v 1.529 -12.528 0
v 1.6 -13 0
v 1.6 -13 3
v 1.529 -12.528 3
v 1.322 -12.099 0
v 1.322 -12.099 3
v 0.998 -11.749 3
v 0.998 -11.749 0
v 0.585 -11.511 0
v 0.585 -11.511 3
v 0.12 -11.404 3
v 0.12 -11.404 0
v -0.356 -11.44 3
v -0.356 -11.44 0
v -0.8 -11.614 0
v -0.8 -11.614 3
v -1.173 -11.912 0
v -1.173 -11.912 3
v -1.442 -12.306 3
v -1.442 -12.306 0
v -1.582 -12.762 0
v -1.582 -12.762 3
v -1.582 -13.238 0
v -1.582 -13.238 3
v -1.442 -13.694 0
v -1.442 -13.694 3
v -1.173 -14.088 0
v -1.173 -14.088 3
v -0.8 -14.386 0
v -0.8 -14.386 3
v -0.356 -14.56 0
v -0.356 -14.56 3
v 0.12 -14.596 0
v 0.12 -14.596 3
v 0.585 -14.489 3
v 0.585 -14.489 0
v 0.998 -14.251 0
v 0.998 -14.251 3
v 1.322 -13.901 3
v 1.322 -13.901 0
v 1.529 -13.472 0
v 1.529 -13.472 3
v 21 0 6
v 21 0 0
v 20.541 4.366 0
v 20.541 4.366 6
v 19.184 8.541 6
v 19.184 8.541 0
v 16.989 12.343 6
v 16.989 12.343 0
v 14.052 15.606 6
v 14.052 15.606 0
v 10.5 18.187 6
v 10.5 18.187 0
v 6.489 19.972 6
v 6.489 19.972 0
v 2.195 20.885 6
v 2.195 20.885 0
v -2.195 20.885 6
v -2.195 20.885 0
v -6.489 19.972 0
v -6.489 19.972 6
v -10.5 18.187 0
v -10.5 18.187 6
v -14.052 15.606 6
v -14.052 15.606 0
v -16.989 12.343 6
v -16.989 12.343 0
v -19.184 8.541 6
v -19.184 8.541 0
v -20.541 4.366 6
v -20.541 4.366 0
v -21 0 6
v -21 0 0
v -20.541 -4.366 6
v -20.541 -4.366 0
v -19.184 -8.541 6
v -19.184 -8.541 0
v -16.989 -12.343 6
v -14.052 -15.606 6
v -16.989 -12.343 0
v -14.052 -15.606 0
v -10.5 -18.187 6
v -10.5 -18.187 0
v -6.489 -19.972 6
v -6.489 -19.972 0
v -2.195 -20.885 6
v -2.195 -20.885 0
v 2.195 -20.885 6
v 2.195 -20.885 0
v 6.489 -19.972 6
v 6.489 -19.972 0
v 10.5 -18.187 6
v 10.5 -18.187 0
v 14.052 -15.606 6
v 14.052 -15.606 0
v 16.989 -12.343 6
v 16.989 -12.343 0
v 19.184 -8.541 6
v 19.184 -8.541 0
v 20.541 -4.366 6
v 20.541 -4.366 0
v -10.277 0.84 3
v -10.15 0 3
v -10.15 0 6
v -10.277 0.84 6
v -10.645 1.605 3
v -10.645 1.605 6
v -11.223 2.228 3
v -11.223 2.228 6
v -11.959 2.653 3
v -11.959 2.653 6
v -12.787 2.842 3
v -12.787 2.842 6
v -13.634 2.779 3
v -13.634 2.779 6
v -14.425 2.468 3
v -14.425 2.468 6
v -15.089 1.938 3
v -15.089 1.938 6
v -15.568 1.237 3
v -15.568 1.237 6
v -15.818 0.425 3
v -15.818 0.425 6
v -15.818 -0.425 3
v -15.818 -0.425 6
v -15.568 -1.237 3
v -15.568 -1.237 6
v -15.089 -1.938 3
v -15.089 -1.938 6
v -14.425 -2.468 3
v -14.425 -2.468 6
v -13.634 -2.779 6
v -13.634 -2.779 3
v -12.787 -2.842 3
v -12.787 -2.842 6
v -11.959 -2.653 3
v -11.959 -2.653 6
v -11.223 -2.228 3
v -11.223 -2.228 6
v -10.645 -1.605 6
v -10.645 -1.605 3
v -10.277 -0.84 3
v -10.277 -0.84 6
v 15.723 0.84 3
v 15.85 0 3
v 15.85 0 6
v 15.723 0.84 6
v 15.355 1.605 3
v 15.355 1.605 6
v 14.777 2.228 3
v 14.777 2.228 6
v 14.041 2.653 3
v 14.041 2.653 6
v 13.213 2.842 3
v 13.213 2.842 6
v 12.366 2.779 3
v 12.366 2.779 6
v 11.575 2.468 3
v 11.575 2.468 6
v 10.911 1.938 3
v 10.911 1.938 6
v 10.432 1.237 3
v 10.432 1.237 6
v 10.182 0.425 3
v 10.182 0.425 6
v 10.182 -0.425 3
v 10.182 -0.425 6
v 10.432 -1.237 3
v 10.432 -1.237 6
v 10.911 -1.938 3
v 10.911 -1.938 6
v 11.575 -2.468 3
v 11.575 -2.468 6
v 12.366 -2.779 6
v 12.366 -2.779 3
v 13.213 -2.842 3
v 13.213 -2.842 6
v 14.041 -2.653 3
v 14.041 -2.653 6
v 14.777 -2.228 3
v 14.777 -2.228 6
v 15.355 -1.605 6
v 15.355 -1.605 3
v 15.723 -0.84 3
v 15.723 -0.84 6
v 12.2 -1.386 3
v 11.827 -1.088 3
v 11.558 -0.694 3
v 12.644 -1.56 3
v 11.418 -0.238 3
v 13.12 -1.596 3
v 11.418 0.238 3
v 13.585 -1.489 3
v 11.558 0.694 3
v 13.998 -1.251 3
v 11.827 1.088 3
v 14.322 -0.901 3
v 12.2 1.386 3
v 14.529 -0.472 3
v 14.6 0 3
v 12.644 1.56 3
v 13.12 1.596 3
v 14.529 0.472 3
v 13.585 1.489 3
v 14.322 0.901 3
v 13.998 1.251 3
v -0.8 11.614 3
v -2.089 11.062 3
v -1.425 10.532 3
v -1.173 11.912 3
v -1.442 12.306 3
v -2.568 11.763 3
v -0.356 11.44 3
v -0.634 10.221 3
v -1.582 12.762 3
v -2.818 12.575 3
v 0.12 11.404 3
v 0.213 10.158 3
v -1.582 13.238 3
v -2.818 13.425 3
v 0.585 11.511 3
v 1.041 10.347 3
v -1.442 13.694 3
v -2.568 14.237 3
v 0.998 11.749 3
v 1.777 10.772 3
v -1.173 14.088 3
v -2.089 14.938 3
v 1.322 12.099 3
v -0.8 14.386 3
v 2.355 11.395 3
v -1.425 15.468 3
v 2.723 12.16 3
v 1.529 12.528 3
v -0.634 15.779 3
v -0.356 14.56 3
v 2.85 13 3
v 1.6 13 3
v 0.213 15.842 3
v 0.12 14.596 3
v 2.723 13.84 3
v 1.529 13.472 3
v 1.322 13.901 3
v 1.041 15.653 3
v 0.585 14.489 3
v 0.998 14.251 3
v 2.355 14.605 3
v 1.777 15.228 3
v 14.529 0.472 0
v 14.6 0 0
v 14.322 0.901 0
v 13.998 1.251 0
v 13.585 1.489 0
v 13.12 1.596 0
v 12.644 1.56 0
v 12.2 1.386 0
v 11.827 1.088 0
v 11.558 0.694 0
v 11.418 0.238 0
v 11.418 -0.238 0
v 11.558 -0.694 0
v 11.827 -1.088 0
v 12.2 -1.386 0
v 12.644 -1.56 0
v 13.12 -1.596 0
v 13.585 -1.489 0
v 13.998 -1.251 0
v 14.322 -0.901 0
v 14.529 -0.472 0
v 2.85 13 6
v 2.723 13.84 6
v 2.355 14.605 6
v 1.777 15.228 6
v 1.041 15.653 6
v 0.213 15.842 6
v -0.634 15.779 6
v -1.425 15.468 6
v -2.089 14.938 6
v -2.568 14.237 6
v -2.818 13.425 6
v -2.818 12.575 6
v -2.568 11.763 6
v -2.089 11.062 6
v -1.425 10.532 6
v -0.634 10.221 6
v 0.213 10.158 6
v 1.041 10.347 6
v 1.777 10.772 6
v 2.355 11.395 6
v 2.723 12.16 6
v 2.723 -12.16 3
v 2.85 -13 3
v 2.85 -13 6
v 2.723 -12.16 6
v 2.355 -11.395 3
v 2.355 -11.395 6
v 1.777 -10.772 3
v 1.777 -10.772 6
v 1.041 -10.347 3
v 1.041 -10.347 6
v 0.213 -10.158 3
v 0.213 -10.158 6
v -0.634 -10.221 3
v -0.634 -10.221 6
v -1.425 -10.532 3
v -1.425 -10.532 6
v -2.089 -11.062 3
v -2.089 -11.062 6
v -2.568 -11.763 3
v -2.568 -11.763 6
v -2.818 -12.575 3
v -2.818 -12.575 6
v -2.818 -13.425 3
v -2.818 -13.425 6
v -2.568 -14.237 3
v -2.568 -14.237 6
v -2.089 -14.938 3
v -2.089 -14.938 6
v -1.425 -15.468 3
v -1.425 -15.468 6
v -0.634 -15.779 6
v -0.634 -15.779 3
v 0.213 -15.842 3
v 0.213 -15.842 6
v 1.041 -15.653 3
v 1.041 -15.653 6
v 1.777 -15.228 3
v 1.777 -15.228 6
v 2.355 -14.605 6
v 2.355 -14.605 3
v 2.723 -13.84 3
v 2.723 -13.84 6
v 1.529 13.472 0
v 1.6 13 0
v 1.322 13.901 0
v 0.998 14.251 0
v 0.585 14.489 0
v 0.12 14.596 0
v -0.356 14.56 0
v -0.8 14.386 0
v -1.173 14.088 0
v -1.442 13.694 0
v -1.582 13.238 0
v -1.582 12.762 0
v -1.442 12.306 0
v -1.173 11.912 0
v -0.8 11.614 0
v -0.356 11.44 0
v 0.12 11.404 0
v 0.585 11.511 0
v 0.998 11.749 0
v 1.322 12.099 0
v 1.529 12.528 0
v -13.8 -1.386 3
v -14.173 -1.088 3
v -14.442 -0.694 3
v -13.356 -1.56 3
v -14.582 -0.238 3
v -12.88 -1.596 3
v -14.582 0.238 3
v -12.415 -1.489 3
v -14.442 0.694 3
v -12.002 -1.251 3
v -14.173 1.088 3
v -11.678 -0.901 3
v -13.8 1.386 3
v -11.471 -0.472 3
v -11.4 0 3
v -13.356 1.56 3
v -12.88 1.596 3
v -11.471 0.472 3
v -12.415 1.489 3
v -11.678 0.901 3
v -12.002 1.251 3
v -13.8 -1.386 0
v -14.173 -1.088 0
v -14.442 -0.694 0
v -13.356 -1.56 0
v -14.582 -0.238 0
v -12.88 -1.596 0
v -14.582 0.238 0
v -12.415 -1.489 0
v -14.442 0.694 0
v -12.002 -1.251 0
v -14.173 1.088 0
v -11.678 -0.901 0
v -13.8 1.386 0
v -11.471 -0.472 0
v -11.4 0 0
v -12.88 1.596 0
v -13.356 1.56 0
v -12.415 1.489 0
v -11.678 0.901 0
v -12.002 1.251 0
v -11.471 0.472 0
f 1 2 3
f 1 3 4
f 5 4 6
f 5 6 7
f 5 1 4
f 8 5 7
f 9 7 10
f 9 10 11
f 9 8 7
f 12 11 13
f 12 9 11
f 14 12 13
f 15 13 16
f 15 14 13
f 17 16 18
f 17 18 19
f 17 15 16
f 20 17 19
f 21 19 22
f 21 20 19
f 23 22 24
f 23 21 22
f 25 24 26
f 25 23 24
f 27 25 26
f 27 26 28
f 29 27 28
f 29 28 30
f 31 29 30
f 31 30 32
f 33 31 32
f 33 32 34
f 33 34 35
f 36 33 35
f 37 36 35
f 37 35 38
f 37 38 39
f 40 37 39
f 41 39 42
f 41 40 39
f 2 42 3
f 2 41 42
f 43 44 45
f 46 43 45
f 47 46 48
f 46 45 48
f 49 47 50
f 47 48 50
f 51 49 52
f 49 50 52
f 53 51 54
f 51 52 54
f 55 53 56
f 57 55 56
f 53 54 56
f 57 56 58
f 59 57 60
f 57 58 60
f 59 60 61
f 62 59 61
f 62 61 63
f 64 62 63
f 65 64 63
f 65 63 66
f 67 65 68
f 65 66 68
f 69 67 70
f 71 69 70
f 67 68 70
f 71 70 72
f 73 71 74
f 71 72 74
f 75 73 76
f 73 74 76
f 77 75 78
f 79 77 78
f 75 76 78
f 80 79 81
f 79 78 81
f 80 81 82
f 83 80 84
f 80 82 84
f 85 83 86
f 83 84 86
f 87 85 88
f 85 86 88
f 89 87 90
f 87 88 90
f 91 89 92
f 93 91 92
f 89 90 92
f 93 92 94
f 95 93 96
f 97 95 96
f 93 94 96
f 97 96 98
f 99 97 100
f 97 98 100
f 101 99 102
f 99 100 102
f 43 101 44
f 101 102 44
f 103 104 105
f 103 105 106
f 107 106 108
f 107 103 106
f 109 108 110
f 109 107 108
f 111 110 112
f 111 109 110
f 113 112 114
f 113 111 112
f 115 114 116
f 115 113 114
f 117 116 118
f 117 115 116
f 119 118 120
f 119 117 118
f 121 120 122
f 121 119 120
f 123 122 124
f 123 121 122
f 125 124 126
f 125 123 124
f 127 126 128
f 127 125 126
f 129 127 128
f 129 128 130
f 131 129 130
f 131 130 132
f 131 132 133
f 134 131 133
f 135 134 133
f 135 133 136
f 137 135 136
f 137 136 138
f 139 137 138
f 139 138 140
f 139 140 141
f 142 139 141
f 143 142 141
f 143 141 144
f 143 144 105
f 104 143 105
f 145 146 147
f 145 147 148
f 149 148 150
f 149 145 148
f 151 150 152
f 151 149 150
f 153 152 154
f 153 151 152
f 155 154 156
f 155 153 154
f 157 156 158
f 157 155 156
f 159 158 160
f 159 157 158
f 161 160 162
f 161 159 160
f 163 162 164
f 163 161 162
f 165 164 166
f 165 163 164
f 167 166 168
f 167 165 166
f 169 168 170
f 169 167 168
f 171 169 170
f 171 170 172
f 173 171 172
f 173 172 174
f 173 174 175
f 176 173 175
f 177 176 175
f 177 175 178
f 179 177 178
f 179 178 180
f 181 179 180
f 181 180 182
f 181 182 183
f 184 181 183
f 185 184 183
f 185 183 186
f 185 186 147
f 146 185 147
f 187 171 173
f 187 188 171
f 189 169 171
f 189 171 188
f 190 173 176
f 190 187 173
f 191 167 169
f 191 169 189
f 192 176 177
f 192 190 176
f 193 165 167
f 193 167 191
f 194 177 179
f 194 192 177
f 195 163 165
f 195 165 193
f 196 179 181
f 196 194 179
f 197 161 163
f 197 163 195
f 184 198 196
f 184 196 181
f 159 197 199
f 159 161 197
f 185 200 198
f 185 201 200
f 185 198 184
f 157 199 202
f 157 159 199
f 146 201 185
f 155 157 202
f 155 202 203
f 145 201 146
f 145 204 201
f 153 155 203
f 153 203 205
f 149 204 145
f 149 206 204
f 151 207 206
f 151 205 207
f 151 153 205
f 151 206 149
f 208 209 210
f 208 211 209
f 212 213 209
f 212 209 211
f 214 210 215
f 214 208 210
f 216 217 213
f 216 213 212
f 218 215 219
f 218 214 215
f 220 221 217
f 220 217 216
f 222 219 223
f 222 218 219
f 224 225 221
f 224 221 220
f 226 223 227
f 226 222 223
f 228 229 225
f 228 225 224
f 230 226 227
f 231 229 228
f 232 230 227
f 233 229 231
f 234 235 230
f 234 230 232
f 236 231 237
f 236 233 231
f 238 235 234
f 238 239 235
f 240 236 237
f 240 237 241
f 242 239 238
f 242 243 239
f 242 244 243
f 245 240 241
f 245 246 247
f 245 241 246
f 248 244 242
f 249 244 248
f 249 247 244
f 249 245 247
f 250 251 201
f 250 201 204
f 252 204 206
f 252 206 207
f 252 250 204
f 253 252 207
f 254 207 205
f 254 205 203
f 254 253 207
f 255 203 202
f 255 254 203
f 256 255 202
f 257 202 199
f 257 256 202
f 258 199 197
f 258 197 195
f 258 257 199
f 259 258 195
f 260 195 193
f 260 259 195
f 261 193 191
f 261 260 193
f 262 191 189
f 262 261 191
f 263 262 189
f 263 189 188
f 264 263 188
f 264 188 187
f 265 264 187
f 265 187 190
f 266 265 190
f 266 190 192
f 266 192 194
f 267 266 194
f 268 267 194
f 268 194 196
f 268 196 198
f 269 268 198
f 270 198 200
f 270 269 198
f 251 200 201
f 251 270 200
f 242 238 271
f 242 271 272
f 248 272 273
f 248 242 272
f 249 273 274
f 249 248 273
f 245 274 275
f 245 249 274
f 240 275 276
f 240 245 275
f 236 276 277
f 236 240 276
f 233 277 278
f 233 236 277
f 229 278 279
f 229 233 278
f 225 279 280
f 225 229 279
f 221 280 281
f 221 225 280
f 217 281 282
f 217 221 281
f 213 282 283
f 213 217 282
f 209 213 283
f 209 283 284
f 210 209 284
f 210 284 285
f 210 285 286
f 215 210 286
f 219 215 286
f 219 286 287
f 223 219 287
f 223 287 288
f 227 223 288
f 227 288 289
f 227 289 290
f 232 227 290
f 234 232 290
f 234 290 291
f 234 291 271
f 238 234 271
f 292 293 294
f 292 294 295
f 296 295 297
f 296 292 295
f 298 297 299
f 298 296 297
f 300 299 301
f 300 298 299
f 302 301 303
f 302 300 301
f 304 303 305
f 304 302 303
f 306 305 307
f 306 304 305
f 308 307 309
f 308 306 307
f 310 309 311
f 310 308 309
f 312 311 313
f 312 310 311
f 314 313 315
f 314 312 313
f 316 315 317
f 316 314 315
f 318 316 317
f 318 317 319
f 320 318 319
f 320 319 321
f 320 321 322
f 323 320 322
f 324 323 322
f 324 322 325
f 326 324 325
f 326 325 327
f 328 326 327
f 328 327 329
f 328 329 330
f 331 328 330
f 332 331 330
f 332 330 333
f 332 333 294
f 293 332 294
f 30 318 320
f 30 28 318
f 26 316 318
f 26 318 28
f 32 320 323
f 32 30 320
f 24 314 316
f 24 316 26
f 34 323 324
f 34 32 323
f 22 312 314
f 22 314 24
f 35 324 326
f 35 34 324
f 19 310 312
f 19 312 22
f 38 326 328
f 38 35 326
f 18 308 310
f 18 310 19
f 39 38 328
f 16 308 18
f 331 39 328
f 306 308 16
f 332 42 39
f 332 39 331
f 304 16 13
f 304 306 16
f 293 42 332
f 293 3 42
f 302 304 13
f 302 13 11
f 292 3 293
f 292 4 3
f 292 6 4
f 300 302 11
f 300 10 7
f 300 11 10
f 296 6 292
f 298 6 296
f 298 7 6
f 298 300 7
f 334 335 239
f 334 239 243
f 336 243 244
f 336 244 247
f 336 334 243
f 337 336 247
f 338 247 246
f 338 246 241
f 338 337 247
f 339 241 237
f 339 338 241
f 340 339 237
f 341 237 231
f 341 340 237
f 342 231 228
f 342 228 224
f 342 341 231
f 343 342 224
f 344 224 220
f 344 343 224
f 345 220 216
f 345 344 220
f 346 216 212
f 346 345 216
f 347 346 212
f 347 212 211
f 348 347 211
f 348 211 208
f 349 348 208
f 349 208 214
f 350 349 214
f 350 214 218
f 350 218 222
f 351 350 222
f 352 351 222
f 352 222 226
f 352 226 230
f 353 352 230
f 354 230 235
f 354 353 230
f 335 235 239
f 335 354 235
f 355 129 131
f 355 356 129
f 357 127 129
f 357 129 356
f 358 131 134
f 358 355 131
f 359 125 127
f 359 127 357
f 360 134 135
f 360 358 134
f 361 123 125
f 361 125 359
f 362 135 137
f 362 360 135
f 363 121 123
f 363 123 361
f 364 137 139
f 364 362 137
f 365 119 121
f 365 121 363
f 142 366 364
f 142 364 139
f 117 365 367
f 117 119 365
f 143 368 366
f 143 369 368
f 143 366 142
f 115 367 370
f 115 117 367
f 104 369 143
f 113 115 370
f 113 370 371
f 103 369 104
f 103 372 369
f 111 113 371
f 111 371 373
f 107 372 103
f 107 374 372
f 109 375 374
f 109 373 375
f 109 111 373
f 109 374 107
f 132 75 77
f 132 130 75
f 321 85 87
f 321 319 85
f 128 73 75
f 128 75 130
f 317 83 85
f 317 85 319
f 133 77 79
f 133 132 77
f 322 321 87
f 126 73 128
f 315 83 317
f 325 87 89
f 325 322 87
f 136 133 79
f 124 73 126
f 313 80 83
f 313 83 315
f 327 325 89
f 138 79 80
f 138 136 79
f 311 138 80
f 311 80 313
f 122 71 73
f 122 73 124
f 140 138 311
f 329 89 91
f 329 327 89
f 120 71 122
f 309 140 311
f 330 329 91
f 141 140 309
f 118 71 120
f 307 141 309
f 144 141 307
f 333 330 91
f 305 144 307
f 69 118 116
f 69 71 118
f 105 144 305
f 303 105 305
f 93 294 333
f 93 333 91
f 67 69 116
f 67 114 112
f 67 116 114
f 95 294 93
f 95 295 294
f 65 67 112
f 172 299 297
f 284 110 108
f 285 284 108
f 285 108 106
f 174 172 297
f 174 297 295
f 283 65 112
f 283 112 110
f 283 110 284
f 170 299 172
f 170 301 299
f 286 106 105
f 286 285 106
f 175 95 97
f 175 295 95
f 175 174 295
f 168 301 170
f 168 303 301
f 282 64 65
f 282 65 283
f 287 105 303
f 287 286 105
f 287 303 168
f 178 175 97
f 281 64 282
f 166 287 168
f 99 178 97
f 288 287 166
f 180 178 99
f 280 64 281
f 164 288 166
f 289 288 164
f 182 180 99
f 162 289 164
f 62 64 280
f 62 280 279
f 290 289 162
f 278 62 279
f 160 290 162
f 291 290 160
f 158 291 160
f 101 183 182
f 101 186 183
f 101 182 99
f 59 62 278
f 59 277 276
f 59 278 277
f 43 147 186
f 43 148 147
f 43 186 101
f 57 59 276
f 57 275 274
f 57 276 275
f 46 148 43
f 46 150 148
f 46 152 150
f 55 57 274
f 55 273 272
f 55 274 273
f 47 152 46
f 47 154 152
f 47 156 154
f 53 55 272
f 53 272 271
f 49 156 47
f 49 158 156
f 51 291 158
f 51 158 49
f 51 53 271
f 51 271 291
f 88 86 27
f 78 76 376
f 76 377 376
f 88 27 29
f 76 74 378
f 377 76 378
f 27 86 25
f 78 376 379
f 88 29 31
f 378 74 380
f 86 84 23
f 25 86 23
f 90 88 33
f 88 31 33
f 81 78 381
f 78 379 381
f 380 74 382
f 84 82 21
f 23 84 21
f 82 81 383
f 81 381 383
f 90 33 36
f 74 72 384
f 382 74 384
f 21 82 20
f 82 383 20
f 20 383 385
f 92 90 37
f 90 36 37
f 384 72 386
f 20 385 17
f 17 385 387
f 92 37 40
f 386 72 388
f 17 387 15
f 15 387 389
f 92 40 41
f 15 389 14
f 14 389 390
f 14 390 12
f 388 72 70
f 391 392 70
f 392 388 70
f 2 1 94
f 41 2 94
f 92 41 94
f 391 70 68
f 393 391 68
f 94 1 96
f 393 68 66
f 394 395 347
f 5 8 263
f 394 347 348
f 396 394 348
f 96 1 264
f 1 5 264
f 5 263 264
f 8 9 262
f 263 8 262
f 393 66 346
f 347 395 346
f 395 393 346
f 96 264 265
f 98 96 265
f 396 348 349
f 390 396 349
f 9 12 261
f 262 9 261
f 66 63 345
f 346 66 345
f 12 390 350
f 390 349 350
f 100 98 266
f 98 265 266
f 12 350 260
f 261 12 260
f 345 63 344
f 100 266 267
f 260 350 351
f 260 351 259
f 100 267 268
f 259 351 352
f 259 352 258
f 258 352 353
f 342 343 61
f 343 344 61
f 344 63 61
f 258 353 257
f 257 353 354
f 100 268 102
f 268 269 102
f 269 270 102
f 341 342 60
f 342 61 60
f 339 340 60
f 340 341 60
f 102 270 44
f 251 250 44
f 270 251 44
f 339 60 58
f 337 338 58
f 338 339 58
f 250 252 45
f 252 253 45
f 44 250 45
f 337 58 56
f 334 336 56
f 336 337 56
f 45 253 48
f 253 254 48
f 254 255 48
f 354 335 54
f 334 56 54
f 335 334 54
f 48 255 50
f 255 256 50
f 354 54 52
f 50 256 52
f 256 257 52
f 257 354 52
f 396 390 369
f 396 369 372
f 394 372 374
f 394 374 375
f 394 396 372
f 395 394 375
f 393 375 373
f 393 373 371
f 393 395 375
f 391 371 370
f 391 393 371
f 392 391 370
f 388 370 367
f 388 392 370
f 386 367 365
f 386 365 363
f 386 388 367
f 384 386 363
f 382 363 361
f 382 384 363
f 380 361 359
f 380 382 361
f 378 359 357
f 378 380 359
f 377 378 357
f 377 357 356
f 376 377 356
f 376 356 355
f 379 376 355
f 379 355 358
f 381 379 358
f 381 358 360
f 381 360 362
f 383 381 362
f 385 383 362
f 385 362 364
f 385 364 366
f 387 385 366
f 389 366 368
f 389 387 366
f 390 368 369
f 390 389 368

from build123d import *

# Parameters (mm, degrees)
SKETCH1_R           = 21
SKETCH1_R_2         = 2.85
BOSS_EXTRUDE1_DEPTH = 6
SKETCH1_4_R         = 2.85
SKETCH1_4_R_2       = 1.6
BOSS_EXTRUDE2_DEPTH = 3


with BuildPart() as part:
    # Sketch1 → Boss-Extrude1 (new body)
    with BuildSketch(Plane(origin=(0, 0, 0), x_dir=(0, 1, 0), z_dir=(0, 0, 1))):
        Circle(SKETCH1_R)
        with Locations((0, -13)):
            Circle(SKETCH1_R_2, mode=Mode.SUBTRACT)
        with Locations((13, 0)):
            Circle(SKETCH1_R_2, mode=Mode.SUBTRACT)
        with Locations((-13, 0)):
            Circle(SKETCH1_R_2, mode=Mode.SUBTRACT)
        with Locations((0, 13)):
            Circle(SKETCH1_R_2, mode=Mode.SUBTRACT)
    extrude(amount=BOSS_EXTRUDE1_DEPTH)

    # Sketch1<4> → Boss-Extrude2 (add)
    # profile 1 of 4: a face of its own
    with BuildSketch(Plane(origin=(0, 0, 0), x_dir=(0, 1, 0), z_dir=(0, 0, 1))):
        with Locations((0, 13)):
            Circle(SKETCH1_4_R)
        with Locations((0, 13)):
            Circle(SKETCH1_4_R_2, mode=Mode.SUBTRACT)
    # profile 2 of 4: a face of its own
    with BuildSketch(Plane(origin=(0, 0, 0), x_dir=(0, 1, 0), z_dir=(0, 0, 1))):
        with Locations((13, 0)):
            Circle(SKETCH1_4_R)
        with Locations((13, 0)):
            Circle(SKETCH1_4_R_2, mode=Mode.SUBTRACT)
    # profile 3 of 4: a face of its own
    with BuildSketch(Plane(origin=(0, 0, 0), x_dir=(0, 1, 0), z_dir=(0, 0, 1))):
        with Locations((0, -13)):
            Circle(SKETCH1_4_R)
        with Locations((0, -13)):
            Circle(SKETCH1_4_R_2, mode=Mode.SUBTRACT)
    # profile 4 of 4: a face of its own
    with BuildSketch(Plane(origin=(0, 0, 0), x_dir=(0, 1, 0), z_dir=(0, 0, 1))):
        with Locations((-13, 0)):
            Circle(SKETCH1_4_R)
        with Locations((-13, 0)):
            Circle(SKETCH1_4_R_2, mode=Mode.SUBTRACT)
    extrude(amount=BOSS_EXTRUDE2_DEPTH)


solid = part.part
